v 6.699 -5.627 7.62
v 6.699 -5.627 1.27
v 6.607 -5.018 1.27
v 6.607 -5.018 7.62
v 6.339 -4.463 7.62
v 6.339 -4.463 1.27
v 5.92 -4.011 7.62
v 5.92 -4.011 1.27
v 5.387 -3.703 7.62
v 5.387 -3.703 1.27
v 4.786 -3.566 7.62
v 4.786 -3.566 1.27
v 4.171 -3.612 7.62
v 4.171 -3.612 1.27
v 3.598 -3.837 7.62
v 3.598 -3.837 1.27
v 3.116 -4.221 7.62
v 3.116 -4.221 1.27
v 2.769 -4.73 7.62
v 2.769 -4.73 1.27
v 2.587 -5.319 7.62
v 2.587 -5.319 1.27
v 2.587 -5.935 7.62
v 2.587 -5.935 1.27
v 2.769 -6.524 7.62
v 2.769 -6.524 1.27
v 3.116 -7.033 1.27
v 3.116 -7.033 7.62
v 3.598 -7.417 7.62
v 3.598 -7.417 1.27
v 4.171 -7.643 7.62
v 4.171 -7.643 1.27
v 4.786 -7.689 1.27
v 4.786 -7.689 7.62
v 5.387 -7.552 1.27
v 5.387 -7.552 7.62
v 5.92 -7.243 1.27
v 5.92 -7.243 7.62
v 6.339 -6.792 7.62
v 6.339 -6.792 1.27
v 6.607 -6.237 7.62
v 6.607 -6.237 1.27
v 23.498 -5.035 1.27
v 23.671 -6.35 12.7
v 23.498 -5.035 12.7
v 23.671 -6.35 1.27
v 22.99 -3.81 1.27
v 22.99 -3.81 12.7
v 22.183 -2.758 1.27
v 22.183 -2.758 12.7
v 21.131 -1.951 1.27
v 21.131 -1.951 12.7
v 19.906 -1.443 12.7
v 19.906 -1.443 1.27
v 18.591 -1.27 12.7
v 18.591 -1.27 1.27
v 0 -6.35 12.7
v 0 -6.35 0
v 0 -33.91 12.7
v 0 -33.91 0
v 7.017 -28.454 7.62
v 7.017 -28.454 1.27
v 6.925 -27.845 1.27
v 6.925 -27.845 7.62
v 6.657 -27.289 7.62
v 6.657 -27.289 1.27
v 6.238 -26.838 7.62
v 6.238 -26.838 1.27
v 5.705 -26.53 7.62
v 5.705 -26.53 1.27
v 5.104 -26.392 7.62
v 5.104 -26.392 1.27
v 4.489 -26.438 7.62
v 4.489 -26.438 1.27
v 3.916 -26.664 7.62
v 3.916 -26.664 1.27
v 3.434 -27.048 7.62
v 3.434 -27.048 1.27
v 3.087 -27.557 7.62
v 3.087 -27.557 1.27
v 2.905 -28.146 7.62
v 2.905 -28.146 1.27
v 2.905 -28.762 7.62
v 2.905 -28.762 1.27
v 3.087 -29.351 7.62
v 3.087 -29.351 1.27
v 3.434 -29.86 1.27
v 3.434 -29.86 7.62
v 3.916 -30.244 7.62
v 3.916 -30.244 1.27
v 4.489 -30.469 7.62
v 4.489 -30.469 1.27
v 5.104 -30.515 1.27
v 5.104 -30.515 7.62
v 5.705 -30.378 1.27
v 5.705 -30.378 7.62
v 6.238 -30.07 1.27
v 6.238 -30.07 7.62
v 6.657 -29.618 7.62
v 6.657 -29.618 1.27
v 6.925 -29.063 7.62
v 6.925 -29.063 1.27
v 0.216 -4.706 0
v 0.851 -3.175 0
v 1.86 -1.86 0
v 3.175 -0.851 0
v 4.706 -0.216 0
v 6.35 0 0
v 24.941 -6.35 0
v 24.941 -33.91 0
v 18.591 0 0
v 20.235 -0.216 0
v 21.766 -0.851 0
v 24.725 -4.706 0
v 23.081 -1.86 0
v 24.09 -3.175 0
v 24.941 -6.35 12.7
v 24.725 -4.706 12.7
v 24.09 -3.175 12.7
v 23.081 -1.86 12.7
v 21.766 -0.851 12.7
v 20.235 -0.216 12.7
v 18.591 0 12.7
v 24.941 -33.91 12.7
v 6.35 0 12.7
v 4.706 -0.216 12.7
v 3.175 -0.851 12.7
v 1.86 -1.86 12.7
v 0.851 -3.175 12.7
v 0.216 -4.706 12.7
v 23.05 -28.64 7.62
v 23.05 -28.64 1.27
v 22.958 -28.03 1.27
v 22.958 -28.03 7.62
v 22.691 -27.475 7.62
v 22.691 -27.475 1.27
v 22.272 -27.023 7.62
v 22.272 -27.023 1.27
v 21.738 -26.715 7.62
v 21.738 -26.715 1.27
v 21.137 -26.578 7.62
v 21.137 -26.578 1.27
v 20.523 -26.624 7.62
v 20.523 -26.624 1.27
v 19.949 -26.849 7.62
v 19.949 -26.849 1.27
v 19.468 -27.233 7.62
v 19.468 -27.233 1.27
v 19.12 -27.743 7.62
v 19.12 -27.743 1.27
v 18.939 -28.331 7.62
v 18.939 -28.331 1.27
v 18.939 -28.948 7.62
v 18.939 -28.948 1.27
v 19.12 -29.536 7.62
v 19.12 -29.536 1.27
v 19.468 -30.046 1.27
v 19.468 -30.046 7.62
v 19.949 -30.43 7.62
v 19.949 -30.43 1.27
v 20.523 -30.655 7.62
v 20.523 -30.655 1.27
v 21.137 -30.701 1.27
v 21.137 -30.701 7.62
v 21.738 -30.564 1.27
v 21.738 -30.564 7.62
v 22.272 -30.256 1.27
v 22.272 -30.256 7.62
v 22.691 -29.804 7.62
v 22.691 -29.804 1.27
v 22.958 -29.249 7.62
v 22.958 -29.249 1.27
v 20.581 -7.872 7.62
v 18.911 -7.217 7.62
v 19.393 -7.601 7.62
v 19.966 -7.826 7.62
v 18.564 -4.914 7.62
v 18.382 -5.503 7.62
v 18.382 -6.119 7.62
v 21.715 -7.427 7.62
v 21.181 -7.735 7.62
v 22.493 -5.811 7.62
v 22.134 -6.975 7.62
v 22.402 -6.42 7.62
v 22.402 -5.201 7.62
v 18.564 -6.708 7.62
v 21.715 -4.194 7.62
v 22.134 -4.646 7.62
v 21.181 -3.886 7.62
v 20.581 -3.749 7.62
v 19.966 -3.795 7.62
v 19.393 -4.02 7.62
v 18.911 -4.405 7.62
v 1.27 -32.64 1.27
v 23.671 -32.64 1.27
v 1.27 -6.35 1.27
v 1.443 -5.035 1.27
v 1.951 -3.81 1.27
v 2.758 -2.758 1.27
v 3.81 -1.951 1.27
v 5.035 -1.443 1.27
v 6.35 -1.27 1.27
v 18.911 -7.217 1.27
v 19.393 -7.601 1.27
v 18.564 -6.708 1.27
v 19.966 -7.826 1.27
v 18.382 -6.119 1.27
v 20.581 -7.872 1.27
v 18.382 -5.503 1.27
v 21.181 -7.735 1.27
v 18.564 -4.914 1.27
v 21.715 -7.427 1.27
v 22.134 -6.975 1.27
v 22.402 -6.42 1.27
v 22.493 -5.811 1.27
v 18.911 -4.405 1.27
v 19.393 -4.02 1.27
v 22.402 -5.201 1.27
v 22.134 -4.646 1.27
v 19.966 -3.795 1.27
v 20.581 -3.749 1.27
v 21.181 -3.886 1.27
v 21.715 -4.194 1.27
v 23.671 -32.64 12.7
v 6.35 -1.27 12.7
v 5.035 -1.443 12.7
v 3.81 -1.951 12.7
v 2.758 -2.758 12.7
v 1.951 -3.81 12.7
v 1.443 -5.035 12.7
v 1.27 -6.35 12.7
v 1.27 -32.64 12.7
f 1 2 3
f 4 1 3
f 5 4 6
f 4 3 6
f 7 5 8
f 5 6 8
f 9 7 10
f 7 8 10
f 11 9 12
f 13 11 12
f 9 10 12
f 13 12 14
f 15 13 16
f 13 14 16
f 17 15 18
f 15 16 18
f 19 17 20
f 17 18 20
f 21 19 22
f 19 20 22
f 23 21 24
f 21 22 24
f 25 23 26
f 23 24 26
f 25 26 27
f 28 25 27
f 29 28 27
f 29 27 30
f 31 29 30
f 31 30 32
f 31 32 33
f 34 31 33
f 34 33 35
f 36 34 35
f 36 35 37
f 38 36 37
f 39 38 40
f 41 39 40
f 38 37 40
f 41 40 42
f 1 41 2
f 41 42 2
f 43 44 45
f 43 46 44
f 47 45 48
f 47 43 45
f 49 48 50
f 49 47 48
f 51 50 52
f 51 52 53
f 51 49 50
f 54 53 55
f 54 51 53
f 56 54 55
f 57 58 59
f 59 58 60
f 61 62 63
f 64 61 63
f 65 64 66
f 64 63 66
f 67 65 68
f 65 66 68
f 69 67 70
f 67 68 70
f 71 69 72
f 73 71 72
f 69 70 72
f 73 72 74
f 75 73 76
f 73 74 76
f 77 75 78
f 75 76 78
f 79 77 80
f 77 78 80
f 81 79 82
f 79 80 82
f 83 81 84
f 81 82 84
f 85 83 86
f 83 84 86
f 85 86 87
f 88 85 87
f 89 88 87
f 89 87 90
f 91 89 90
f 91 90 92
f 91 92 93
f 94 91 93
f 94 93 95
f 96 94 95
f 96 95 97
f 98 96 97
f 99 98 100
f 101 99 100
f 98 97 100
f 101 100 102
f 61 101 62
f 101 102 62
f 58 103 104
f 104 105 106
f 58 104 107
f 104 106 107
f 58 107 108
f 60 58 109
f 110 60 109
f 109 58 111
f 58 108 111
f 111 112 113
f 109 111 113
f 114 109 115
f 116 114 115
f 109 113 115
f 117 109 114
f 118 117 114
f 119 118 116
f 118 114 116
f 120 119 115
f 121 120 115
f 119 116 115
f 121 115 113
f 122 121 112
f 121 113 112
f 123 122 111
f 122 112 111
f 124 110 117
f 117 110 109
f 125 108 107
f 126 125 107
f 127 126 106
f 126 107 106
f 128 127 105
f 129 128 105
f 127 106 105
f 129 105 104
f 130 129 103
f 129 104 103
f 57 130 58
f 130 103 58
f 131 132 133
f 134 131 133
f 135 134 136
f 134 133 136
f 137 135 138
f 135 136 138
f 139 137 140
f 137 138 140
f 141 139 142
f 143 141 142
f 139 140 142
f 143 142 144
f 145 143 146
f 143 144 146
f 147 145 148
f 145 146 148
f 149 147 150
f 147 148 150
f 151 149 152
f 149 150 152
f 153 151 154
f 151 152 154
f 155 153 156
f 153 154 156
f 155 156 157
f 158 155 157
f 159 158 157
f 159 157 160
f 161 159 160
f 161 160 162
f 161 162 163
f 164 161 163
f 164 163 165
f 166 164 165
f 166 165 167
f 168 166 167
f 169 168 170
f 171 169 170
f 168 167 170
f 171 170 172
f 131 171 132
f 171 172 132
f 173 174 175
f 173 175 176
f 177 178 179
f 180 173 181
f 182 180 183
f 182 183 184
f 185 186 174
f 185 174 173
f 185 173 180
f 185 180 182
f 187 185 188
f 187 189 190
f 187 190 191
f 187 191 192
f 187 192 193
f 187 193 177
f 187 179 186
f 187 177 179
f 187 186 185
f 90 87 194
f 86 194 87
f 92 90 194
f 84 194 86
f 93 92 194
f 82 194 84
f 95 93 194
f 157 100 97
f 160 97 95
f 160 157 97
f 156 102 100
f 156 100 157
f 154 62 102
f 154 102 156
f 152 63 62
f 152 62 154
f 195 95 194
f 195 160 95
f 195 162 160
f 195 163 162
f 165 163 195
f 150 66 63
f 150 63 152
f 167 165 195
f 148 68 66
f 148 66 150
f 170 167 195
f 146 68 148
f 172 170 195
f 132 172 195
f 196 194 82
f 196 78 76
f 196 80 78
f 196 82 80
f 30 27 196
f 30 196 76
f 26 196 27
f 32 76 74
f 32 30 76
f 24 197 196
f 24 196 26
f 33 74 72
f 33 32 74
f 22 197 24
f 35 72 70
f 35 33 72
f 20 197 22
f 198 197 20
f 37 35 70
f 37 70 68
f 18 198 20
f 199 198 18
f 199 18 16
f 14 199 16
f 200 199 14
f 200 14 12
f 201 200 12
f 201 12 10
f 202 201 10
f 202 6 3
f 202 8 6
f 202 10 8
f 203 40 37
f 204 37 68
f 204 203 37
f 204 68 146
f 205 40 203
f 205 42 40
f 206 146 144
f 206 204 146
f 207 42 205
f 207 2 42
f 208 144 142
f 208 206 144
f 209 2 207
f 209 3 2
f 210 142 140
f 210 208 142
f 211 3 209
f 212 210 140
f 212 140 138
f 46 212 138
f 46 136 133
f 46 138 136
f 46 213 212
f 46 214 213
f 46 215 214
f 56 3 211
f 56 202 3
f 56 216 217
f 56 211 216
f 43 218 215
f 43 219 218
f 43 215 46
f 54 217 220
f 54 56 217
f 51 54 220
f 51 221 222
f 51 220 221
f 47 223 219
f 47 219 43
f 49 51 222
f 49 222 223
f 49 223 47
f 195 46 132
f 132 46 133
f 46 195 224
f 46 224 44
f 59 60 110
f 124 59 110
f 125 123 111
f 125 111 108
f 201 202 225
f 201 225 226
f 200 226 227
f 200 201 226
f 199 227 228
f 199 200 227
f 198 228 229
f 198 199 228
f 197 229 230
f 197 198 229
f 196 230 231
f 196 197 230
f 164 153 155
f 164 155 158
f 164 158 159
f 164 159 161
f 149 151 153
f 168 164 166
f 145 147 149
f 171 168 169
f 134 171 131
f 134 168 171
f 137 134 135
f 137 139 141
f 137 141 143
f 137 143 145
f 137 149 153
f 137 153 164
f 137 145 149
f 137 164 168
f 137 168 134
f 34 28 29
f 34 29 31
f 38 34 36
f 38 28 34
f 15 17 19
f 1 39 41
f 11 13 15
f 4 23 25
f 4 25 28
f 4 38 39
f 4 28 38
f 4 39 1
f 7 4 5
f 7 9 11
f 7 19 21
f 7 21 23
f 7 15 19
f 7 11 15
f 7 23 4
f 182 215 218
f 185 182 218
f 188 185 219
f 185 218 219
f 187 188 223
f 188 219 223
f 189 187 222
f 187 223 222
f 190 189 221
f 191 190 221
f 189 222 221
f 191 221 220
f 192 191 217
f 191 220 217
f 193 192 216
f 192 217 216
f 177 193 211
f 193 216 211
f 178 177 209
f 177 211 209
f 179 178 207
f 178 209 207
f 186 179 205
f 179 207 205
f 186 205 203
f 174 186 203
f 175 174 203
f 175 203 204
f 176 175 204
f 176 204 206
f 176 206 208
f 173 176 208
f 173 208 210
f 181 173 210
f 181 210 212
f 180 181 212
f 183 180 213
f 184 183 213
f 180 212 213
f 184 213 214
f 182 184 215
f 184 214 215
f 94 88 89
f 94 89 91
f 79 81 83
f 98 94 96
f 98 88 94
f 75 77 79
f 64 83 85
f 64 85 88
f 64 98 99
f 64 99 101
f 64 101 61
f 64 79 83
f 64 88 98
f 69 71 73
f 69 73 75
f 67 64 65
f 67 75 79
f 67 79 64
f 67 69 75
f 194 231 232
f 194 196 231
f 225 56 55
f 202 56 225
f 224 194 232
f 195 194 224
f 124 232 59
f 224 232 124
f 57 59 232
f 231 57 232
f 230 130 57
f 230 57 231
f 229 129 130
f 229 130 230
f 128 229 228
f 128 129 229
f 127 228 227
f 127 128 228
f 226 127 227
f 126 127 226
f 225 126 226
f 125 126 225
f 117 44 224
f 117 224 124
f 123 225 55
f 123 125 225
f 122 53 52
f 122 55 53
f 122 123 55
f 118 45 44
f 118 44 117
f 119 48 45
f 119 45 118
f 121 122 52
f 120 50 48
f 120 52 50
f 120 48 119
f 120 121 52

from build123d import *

# Parameters (mm, degrees)
F1_DEPTH = 12.7
F2_T     = -1.27
F3_R     = 2.067279
F4_DEPTH = 6.35
F5_R     = 2.067279
F6_DEPTH = 6.35


with BuildPart() as f1:
    # F0 (on Top) → F1 (new body)
    with BuildSketch(Plane.XY):
        with BuildLine():
            Line((18.591051, 0), (6.35, 0))
            ThreePointArc((6.35, 0), (1.859872, -1.859872), (0, -6.35))
            Line((0, -6.35), (0, -33.910388))
            Line((0, -33.910388), (24.941051, -33.910388))
            Line((24.941051, -33.910388), (24.941051, -6.35))
            ThreePointArc((24.941051, -6.35), (23.081179, -1.859872), (18.591051, 0))
        make_face()
    extrude(amount=F1_DEPTH)

    # F2
    f2_openings = [f1.faces().sort_by_distance(p)[0] for p in [
        (12.470526, -17.279761, 12.7),
    ]]
    offset(amount=F2_T, openings=f2_openings)

    # F3 (on face) → F4 (join)
    with BuildSketch(Plane.XY.offset(1.27)):
        with Locations((4.631324, -5.627174)):
            Circle(F3_R)
    extrude(amount=F4_DEPTH)

    # F5 (on face) → F6 (join)
    with BuildSketch(Plane.XY.offset(1.27)):
        with Locations((4.949421, -28.45392)):
            Circle(F5_R)
        with Locations((20.426176, -5.810678)):
            Circle(F5_R)
        with Locations((20.982977, -28.639521)):
            Circle(F5_R)
    extrude(amount=F6_DEPTH)


solid = f1.part
